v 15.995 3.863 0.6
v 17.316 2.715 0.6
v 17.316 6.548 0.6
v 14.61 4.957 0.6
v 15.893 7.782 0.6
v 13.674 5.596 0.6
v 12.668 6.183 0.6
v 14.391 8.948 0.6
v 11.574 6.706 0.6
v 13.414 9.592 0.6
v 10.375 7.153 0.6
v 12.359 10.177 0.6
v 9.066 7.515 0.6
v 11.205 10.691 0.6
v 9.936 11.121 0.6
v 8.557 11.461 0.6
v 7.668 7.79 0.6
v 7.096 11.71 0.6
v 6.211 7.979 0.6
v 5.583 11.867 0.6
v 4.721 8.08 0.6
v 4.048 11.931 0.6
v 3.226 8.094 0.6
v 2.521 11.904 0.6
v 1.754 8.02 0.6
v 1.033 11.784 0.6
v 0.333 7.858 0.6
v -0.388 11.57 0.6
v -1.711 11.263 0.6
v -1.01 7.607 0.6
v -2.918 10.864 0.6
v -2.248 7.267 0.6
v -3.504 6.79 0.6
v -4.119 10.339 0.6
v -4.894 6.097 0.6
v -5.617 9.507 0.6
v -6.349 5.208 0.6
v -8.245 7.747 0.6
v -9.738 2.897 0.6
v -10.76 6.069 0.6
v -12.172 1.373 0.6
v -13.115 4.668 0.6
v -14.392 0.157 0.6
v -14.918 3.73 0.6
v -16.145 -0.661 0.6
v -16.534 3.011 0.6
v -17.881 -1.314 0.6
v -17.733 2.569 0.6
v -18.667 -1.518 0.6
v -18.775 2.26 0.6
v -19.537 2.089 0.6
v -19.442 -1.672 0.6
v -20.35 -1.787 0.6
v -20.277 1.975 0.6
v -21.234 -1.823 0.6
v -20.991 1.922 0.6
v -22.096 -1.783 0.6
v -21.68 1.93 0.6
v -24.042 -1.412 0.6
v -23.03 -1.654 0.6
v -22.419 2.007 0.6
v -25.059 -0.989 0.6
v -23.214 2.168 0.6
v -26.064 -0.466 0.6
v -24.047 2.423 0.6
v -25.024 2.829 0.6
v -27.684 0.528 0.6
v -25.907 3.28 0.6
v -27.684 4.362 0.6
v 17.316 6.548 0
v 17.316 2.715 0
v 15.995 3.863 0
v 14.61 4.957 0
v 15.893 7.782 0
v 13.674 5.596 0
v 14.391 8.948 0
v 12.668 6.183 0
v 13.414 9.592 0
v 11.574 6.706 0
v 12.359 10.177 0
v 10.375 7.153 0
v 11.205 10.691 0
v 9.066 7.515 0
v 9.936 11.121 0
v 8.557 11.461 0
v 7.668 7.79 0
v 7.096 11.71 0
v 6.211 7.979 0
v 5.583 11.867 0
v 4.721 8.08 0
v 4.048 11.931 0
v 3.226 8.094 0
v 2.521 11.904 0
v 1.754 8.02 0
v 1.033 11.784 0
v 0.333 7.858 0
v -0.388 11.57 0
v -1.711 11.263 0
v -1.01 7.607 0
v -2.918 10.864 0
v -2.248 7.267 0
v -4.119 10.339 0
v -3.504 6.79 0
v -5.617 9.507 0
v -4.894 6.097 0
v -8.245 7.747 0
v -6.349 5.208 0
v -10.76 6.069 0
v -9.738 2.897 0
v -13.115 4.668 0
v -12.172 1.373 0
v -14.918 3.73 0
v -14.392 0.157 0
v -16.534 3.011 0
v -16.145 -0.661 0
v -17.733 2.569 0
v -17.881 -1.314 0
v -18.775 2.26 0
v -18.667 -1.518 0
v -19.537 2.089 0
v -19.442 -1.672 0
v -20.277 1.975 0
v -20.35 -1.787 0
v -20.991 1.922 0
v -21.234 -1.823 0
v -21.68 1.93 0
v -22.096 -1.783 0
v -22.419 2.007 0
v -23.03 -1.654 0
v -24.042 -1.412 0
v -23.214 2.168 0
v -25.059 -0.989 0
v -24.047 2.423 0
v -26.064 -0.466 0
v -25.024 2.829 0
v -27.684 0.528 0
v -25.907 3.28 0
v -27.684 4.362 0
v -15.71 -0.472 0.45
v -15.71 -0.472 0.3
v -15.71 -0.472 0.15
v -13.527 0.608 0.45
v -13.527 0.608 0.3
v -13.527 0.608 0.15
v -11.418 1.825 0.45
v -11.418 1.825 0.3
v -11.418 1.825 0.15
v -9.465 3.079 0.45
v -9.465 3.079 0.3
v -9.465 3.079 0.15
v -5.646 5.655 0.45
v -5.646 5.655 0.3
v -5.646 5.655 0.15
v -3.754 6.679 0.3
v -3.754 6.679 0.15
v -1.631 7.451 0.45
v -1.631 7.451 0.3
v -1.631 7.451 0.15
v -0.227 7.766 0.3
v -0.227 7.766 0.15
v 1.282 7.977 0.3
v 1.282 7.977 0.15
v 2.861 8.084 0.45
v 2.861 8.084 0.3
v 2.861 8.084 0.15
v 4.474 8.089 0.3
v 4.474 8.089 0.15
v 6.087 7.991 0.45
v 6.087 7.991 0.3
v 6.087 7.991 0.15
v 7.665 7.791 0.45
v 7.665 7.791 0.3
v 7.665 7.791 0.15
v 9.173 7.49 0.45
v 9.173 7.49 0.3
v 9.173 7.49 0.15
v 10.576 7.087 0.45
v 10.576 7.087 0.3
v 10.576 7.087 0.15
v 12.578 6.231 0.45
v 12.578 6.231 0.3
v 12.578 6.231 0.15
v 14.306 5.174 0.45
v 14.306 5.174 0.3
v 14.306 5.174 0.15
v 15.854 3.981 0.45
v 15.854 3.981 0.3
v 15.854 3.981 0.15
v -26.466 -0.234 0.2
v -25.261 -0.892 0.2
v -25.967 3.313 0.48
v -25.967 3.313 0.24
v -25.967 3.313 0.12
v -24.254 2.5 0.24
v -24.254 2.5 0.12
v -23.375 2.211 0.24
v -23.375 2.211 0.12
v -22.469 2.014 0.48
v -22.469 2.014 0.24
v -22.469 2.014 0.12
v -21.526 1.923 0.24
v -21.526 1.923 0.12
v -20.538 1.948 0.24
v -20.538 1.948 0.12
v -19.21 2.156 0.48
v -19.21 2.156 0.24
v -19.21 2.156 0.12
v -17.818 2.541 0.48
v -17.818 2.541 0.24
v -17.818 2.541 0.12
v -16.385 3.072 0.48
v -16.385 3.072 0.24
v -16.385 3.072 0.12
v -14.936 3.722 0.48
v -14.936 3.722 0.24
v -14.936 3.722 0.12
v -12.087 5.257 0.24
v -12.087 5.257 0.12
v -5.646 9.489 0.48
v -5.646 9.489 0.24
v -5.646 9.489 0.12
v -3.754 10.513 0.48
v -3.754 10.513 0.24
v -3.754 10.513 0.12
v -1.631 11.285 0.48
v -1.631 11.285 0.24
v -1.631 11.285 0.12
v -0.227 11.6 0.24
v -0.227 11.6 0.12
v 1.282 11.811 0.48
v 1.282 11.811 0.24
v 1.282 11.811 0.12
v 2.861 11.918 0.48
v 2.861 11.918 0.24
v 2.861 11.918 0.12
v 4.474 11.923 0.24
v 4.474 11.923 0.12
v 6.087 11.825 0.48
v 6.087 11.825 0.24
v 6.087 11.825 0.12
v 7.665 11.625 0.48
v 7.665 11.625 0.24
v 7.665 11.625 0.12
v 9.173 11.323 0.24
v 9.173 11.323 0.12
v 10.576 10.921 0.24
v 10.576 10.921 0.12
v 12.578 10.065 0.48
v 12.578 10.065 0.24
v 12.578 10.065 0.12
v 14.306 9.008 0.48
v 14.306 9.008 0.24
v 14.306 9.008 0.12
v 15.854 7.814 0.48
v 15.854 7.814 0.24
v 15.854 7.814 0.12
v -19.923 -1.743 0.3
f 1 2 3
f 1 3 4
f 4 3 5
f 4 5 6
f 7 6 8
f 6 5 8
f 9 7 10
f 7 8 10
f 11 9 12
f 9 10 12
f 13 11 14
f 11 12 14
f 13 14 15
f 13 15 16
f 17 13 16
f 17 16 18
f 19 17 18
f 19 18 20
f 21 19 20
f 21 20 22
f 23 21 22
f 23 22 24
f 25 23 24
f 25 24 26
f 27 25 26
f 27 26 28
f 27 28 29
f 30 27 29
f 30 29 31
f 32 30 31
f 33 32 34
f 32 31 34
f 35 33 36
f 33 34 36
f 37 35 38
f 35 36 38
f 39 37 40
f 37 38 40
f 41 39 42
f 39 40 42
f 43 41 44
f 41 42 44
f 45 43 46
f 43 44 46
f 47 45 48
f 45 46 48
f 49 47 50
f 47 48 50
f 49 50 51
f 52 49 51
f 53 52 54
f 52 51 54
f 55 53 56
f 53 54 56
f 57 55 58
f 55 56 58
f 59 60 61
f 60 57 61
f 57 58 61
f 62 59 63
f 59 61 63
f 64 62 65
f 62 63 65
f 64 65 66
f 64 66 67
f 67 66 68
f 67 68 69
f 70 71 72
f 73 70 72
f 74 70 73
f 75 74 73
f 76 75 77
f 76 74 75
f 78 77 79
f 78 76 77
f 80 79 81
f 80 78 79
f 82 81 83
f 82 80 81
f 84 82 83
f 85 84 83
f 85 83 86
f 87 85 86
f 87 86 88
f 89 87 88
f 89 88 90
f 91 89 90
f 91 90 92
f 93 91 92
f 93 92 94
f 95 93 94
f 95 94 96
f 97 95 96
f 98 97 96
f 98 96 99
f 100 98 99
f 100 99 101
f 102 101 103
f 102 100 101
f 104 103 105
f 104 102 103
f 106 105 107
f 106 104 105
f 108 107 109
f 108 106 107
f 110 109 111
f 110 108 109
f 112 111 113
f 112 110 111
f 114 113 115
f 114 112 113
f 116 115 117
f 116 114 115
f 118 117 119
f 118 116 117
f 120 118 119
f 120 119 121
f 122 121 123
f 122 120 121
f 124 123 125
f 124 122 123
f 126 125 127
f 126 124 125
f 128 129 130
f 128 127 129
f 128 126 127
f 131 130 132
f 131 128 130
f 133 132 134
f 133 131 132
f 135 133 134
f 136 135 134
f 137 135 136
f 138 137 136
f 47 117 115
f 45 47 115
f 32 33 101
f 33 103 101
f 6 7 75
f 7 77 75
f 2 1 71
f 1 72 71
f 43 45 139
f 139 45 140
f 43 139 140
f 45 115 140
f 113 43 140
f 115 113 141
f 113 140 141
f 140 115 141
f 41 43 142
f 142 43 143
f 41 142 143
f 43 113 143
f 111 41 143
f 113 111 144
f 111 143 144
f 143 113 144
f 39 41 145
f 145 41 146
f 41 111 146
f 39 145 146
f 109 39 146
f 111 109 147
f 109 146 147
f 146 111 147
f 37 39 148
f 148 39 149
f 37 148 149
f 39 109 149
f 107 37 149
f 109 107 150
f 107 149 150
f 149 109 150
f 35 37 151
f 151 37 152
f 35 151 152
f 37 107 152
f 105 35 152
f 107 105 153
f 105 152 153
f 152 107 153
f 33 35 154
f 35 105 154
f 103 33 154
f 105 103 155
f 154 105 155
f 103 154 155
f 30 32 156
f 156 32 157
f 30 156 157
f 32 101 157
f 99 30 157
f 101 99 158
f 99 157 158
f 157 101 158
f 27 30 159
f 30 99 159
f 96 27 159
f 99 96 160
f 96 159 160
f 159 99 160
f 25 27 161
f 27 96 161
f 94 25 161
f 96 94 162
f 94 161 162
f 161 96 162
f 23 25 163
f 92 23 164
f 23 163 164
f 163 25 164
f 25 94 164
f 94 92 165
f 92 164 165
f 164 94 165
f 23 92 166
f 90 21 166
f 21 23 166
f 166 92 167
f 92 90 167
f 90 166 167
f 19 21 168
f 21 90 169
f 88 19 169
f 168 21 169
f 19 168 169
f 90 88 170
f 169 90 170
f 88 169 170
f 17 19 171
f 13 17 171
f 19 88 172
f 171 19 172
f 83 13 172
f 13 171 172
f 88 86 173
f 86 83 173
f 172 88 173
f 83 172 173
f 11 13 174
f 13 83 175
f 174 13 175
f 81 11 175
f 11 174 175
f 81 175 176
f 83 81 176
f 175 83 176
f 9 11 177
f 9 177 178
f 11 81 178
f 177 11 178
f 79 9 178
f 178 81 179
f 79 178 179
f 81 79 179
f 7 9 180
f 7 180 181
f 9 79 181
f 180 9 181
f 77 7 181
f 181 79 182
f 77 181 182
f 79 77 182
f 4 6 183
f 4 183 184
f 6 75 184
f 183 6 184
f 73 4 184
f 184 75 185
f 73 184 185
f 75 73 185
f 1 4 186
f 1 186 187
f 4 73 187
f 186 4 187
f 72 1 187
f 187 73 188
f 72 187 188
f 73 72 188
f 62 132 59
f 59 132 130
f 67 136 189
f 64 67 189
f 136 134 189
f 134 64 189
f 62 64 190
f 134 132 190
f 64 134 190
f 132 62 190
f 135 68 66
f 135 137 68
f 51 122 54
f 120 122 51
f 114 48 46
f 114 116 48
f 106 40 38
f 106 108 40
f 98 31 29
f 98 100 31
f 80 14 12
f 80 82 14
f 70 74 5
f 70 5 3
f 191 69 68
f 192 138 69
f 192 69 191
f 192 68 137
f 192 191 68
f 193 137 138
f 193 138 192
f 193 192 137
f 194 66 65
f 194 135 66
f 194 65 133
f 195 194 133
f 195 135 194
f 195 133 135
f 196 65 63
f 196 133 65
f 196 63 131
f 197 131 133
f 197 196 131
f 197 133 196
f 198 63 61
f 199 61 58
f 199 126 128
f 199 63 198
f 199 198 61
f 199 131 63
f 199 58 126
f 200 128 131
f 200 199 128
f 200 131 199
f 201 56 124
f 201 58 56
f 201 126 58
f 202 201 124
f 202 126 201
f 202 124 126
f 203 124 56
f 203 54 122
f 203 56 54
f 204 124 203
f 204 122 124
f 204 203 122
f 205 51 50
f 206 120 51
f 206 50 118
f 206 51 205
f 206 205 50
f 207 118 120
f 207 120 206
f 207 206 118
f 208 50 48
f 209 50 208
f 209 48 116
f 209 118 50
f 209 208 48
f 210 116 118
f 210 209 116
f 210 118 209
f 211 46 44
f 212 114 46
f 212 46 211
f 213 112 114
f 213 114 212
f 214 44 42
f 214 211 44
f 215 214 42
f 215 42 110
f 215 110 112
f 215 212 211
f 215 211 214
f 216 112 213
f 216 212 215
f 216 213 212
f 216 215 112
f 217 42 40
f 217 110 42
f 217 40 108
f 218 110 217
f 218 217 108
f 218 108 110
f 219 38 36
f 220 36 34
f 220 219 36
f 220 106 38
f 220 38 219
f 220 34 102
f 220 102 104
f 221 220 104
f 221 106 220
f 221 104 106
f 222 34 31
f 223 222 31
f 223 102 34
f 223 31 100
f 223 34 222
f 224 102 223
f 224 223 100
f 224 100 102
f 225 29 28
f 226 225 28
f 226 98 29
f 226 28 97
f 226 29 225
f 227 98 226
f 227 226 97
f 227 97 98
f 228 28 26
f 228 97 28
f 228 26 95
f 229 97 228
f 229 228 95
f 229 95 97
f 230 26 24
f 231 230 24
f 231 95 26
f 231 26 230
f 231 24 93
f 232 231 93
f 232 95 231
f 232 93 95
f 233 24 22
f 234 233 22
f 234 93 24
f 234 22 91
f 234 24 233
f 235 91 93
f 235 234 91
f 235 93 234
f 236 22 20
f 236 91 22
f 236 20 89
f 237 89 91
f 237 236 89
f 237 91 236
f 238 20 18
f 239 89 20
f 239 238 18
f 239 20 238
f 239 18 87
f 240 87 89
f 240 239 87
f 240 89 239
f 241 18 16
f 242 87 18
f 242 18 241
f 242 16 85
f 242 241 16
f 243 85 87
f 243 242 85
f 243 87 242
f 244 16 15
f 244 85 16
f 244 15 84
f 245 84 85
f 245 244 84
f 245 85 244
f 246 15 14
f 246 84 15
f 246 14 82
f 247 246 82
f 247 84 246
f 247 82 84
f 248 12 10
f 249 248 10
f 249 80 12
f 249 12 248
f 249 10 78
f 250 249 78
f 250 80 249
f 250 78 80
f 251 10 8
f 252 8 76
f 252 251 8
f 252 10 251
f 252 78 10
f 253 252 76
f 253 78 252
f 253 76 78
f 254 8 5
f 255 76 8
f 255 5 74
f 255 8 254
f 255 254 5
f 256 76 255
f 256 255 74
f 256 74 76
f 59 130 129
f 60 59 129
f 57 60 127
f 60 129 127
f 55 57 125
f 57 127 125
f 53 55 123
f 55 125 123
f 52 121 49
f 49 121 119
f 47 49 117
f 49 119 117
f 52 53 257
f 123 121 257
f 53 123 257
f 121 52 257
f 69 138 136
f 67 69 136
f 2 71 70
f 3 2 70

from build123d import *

# Parameters (mm, degrees)
F1_DEPTH = 0.6


# Not quite as in the source:
# - ends of sketch curves that miss each other by under 0.0002 mm in the source are joined


with BuildPart() as f1:
    # F0 (on Top) → F1 (new body)
    with BuildSketch(Plane.XY):
        with BuildLine():
            add(Edge.make_bspline(
                [(-27.683602202, 4.3622240029), (-25.358796936, 2.84664598), (-20.5608734618, 0.2826177406), (-8.9542219297, 6.8655938987), (-2.3967650886, 12.3788446821), (11.1135658845, 12.0190665422), (15.3822705643, 8.2562465754), (17.316397798, 6.5484584641)],
                knots=[0, 0, 0, 0, 0.1765674616, 0.400525264, 0.5930940384, 0.8177624668, 1, 1, 1, 1], degree=3))
            Line((-27.683602202, 4.3622240029), (-27.683602202, 0.5283586101))
            add(Edge.make_bspline(
                [(-27.683602202, 0.5283586101), (-26.4505713043, -0.2754743949), (-25.2765264365, -0.9709345602), (-24.0420313354, -1.4122566)],
                knots=[0, 0, 0, 0, 0.0936479357, 0.0936479357, 0.0936479357, 0.0936479357], degree=3))
            add(Edge.make_bspline(
                [(-24.0420313354, -1.4122566), (-22.7413190859, -1.7919411675), (-20.7616668205, -1.9846677675), (-18.5750781824, -1.5127811233), (-17.8813856832, -1.3136689309)],
                knots=[0.0896789193, 0.0896789193, 0.0896789193, 0.0896789193, 0.182373931, 0.2245564082, 0.2245564082, 0.2245564082, 0.2245564082], degree=3))
            add(Edge.make_bspline(
                [(-17.8813856832, -1.3136689309), (-15.0305462556, -0.3944745735), (-8.3944877894, 3.5023312426), (-2.3967655326, 8.5449792893), (11.1135654405, 8.1852011494), (15.3822701203, 4.4223811826), (17.316397354, 2.7145930713)],
                knots=[0.2312988961, 0.2312988961, 0.2312988961, 0.2312988961, 0.400525264, 0.5930940384, 0.8177624668, 1, 1, 1, 1], degree=3))
            Line((17.316397354, 2.7145930713), (17.316397798, 6.5484584641))
        make_face()
    extrude(amount=F1_DEPTH)


solid = f1.part
